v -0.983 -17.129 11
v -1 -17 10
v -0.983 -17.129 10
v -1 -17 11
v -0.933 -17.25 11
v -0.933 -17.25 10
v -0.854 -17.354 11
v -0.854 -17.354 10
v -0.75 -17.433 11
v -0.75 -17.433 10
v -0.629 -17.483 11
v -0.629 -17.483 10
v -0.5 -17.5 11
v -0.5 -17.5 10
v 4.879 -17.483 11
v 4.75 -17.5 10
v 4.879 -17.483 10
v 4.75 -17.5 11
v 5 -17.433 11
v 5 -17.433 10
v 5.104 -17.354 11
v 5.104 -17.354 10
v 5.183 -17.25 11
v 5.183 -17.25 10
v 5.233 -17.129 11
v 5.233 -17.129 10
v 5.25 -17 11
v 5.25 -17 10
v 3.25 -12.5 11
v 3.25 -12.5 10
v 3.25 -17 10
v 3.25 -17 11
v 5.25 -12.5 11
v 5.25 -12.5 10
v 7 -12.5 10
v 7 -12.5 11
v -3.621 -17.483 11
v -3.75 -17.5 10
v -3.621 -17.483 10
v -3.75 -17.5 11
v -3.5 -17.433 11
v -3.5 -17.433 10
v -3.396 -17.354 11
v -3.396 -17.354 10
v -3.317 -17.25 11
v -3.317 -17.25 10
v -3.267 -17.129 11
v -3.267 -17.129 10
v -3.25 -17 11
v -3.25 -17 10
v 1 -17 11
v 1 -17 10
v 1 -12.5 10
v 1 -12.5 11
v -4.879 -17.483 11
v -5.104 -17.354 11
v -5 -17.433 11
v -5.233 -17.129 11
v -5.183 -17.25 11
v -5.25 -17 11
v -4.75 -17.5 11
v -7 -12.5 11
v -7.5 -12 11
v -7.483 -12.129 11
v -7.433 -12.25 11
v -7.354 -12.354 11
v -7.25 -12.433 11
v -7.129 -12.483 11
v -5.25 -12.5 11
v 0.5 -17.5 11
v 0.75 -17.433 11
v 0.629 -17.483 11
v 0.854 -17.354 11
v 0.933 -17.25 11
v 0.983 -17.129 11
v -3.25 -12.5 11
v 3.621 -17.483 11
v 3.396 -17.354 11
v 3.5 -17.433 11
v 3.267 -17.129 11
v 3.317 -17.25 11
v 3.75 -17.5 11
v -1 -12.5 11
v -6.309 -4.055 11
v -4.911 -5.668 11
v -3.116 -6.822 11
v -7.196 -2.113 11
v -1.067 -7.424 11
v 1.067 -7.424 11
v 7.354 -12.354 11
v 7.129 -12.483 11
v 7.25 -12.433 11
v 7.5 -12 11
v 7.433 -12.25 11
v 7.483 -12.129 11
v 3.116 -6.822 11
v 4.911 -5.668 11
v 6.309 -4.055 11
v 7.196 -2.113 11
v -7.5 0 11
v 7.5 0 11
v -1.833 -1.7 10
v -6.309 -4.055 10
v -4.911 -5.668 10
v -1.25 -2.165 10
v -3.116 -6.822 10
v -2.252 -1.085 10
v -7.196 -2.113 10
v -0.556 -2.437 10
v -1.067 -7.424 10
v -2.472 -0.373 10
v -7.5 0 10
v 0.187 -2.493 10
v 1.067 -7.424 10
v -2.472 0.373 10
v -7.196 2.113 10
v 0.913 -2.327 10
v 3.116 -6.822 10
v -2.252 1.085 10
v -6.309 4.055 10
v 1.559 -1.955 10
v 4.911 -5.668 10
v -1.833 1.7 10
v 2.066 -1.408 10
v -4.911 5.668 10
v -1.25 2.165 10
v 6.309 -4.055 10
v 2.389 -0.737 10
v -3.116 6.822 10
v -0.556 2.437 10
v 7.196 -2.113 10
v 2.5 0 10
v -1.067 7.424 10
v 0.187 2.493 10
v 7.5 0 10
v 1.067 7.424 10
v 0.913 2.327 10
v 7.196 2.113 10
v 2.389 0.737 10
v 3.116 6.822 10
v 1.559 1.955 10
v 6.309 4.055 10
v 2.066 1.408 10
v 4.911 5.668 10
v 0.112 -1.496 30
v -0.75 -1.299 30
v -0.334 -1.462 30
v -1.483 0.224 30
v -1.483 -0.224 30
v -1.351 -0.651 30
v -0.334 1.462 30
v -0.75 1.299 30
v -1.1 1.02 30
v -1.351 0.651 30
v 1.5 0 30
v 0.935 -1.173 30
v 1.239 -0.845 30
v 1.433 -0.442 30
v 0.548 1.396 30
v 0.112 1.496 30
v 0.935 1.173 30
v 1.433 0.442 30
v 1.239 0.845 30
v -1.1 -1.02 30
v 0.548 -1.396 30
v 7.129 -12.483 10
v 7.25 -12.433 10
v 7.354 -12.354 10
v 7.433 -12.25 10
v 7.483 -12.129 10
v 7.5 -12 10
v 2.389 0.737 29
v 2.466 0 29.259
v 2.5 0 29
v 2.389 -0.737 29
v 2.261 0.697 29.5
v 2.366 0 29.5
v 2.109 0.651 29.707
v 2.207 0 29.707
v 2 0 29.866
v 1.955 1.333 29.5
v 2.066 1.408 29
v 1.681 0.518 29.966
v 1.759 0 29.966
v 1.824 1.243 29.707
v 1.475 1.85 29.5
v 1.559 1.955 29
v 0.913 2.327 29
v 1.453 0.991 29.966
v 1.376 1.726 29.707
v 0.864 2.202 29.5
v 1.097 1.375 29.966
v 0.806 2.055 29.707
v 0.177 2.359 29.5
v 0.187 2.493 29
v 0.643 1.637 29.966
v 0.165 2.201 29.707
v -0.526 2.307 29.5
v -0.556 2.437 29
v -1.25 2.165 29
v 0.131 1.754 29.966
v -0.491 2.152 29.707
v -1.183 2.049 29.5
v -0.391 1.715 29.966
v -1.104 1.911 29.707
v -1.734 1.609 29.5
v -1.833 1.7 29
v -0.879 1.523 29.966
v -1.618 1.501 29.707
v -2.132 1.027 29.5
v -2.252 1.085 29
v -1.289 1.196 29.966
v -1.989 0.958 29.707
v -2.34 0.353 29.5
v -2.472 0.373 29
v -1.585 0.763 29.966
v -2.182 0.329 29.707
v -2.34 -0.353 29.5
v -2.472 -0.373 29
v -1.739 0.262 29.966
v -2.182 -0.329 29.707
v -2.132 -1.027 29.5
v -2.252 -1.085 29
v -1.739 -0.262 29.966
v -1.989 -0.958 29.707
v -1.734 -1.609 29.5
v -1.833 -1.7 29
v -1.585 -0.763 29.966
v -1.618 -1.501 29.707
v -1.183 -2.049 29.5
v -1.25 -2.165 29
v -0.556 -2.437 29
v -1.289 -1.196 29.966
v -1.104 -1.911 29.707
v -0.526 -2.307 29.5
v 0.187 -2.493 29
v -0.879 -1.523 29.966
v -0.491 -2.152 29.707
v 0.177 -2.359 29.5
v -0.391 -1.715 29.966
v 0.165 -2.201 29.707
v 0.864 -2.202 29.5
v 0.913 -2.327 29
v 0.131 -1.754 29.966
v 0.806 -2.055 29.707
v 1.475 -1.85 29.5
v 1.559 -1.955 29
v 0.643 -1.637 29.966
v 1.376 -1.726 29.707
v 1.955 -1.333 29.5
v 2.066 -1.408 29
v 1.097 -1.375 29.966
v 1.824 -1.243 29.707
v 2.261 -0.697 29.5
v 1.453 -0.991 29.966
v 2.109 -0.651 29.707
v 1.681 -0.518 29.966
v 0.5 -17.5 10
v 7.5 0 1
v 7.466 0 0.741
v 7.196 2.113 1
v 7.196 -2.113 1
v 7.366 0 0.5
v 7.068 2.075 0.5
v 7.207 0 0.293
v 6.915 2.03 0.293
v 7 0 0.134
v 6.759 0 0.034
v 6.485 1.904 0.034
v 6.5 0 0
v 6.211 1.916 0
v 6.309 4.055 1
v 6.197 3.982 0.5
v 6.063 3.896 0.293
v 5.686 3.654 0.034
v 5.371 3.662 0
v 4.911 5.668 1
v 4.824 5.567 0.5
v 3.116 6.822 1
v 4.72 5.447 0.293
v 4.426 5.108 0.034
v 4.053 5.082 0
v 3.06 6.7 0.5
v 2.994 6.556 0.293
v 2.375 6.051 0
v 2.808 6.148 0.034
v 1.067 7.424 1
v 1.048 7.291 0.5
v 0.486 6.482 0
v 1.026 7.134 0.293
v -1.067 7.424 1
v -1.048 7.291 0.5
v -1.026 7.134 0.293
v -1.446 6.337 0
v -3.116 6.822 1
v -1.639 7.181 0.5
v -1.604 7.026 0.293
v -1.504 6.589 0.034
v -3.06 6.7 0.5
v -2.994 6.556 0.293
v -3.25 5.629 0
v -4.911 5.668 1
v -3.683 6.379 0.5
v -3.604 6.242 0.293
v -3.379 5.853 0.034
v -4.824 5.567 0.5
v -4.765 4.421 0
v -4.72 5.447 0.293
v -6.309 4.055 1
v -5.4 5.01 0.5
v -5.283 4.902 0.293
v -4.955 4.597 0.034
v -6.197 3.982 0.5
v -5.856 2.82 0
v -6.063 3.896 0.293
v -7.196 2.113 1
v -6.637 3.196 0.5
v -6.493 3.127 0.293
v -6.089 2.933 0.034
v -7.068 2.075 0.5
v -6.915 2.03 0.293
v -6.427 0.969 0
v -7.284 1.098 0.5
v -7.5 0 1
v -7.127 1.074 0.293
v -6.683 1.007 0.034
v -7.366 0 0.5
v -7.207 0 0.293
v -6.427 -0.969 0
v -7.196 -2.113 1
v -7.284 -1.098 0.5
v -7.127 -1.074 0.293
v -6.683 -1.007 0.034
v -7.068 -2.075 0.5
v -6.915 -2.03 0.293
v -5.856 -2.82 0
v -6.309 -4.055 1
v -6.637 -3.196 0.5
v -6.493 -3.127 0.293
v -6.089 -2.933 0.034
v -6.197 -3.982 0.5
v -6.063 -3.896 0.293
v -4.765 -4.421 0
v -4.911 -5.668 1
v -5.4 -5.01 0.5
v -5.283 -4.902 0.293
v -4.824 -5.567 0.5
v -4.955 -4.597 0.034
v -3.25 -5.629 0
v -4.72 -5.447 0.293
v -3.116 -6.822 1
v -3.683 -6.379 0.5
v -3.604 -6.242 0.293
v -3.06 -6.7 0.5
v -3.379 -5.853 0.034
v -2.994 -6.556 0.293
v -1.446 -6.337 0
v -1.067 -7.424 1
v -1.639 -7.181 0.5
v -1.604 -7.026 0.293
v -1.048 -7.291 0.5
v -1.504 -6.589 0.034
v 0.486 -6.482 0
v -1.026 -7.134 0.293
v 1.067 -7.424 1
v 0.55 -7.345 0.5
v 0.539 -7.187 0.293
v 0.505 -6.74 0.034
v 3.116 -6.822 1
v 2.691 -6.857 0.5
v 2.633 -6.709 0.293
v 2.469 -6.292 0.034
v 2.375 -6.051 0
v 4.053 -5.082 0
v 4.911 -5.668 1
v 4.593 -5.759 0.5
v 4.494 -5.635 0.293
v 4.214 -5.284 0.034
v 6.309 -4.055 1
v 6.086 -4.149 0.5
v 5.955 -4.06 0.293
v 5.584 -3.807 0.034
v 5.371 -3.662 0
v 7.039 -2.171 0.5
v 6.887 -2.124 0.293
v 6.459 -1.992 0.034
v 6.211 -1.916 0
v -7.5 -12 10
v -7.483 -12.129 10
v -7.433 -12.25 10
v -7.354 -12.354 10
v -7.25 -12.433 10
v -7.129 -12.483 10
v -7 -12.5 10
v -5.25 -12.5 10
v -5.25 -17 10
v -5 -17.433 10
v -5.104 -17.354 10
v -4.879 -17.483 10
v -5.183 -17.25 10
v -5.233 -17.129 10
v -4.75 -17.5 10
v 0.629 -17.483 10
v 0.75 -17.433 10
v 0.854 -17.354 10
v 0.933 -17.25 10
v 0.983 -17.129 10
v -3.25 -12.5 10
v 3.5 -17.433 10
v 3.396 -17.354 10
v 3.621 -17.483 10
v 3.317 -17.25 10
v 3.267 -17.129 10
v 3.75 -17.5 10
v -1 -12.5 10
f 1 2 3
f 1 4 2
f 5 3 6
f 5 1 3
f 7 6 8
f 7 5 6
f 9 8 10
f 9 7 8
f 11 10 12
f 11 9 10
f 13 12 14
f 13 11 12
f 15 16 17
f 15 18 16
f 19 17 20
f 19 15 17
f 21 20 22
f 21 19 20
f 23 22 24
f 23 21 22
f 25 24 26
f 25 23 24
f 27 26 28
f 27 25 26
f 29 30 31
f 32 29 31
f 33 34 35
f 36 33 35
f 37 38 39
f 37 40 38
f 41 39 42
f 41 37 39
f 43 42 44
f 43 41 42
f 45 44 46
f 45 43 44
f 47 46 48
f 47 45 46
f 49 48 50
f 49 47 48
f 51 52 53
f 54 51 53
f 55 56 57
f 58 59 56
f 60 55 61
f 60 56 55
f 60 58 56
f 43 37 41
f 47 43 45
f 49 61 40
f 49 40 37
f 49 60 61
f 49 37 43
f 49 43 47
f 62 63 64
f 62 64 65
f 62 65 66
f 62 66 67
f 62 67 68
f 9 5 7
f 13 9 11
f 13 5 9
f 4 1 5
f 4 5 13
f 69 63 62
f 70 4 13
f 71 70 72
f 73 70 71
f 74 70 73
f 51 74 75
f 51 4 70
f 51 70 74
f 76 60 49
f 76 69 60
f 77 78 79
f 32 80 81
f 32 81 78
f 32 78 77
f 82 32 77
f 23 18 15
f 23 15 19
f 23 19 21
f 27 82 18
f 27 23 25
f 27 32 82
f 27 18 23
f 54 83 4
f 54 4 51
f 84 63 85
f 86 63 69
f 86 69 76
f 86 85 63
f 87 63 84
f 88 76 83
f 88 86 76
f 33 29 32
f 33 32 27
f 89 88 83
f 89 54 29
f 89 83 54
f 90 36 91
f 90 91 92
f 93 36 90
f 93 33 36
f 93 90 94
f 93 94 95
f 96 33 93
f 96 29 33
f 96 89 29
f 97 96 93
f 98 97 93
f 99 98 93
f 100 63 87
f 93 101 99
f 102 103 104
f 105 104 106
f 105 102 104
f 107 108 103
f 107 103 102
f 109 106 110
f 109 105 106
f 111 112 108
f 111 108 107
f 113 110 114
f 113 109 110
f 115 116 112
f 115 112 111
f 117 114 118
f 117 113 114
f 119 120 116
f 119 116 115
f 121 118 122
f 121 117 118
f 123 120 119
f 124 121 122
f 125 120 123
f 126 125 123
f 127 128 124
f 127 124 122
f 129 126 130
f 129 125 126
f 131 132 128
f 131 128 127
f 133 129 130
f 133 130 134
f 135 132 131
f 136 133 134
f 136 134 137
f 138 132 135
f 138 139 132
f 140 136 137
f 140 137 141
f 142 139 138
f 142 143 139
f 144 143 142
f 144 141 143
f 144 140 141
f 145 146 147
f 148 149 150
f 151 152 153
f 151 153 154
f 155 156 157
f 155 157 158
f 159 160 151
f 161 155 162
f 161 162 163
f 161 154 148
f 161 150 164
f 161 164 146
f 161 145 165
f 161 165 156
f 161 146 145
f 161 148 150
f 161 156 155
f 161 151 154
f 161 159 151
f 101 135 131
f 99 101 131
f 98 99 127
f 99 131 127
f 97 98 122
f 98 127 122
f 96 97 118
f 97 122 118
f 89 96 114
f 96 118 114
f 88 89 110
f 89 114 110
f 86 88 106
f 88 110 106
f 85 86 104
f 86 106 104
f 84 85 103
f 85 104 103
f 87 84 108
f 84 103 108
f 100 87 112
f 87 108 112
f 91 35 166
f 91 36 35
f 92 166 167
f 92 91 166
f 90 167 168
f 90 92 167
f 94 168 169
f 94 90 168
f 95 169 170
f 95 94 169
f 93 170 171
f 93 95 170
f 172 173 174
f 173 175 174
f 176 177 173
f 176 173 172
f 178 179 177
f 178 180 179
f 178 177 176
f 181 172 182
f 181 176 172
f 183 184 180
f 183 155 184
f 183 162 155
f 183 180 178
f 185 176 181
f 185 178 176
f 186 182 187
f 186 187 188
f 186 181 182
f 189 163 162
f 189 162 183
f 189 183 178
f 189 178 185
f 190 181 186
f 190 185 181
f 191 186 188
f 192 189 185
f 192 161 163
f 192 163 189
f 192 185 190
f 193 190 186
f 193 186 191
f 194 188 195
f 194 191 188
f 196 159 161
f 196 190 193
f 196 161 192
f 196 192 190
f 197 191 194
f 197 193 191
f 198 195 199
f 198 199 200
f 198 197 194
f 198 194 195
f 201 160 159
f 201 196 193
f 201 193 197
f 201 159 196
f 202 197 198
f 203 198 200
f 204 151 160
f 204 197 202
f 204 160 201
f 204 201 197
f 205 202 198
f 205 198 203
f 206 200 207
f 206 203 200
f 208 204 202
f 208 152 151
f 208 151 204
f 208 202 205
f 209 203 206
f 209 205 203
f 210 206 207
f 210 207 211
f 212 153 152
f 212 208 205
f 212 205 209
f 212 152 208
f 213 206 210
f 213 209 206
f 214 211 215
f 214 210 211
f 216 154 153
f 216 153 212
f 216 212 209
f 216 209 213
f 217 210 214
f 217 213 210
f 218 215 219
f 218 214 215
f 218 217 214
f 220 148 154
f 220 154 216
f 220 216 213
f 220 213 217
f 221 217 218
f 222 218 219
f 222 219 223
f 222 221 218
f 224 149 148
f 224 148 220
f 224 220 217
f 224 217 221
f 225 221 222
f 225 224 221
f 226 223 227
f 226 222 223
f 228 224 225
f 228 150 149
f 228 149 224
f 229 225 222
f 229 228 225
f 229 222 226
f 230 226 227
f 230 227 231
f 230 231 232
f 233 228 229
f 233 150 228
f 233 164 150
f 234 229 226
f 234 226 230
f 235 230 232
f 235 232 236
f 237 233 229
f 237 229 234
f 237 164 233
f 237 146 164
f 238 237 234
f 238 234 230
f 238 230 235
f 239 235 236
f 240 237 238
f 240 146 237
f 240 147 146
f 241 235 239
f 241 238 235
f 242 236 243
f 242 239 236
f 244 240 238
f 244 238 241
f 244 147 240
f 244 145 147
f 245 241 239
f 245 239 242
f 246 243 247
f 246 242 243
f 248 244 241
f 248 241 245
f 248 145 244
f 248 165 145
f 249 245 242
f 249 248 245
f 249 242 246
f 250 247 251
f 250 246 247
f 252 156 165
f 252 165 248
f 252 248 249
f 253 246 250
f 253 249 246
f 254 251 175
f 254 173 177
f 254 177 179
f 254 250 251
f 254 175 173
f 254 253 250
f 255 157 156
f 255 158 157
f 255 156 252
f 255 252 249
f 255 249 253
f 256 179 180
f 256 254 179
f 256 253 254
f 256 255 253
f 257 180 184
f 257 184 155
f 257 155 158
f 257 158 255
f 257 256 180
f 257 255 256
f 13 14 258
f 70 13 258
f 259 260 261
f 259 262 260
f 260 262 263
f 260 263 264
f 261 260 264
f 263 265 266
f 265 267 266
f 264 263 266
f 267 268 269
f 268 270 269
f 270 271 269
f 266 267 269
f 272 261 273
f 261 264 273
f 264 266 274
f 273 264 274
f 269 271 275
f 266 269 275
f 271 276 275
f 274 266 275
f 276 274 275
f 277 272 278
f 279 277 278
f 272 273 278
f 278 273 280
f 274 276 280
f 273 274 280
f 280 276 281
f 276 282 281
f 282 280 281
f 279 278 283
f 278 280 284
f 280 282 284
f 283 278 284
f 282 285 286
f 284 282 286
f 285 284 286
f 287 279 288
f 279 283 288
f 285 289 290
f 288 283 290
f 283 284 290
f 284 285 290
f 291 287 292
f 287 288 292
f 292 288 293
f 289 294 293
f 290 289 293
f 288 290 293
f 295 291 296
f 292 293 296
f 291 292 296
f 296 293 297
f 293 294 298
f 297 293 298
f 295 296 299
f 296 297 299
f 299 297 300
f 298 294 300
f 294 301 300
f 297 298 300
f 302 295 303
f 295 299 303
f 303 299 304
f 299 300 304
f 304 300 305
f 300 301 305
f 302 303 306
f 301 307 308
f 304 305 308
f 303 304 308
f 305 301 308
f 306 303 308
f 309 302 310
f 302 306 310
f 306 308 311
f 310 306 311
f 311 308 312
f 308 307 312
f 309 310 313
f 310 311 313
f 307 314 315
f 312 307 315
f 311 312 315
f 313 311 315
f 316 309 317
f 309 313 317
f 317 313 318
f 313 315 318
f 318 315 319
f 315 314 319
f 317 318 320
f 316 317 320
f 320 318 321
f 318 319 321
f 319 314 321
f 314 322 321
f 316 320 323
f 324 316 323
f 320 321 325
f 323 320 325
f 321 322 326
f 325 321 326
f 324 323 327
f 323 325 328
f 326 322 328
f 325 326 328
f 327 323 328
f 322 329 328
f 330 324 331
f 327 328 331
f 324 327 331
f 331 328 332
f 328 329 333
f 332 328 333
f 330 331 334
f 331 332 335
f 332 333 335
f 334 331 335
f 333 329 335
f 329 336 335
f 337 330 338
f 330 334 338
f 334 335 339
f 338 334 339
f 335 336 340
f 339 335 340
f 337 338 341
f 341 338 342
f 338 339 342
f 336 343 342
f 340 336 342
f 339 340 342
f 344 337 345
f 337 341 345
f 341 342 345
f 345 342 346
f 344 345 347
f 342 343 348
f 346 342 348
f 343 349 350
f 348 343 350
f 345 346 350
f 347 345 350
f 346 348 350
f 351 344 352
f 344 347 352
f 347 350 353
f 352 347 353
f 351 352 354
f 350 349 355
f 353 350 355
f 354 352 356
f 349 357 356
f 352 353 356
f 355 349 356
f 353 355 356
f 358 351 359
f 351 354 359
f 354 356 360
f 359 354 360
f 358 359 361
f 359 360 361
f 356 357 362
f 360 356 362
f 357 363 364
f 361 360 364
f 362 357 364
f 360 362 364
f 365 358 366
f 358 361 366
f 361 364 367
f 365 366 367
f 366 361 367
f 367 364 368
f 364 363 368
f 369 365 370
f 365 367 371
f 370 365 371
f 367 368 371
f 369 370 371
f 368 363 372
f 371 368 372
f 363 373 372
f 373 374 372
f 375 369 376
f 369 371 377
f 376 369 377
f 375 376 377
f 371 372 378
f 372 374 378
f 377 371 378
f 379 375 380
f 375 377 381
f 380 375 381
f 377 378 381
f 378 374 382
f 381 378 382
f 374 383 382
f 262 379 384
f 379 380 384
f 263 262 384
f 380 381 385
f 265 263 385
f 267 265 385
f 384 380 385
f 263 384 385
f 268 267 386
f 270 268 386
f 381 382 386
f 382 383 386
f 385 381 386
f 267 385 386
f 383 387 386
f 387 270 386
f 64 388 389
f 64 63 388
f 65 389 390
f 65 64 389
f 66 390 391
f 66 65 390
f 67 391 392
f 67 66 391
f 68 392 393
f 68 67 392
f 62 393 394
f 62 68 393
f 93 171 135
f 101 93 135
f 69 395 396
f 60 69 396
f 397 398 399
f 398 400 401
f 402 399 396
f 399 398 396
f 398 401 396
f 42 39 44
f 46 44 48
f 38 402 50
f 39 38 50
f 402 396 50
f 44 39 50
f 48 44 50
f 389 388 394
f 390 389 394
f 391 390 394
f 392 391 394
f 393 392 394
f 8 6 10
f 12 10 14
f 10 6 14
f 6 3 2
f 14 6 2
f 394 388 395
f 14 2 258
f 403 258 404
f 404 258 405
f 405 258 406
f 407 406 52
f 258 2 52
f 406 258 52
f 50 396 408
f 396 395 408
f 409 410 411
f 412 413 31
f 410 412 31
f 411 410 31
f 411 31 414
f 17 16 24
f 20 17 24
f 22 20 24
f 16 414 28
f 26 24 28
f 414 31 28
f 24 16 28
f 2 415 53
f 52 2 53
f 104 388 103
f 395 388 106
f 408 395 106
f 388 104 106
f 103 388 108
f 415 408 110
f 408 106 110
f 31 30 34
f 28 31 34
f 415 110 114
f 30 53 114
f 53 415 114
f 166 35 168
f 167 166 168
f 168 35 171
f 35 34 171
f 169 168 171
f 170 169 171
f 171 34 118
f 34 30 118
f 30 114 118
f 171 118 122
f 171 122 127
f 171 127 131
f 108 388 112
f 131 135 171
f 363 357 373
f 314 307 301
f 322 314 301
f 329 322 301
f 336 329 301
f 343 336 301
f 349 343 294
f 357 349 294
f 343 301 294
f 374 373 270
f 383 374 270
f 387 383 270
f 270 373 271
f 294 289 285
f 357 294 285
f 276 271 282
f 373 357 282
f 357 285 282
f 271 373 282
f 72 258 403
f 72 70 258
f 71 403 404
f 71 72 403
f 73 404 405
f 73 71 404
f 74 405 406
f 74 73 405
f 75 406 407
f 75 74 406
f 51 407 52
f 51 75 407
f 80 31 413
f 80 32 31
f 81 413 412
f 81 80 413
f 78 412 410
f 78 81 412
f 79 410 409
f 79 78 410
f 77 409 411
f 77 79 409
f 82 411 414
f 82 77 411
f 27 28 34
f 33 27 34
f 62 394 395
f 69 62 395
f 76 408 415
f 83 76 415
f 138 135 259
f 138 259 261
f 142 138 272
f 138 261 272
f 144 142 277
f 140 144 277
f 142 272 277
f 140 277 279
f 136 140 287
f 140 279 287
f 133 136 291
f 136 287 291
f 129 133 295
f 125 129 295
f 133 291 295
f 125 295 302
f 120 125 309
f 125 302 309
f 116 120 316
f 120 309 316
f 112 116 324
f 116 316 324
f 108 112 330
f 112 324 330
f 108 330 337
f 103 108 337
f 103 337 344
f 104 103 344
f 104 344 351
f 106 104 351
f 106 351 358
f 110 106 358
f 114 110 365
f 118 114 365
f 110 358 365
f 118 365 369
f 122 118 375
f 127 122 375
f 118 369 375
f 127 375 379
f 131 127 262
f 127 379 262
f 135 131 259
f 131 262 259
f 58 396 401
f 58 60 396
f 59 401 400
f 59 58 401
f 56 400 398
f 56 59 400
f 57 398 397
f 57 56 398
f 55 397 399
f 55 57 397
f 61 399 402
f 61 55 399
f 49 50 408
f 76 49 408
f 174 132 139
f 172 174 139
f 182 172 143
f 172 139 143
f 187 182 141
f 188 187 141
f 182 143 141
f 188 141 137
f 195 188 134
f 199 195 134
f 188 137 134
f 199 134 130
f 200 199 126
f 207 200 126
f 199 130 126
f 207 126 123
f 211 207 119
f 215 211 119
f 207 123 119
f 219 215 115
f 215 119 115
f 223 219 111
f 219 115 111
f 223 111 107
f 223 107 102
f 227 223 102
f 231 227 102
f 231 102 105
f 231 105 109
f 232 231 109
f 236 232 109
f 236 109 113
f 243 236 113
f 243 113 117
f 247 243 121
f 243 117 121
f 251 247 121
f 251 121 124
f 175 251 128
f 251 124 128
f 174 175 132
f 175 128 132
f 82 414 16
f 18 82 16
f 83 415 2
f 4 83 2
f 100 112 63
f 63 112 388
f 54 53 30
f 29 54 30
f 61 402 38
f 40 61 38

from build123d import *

# Parameters (mm, degrees)
IZIM1_R                     = 7.5
Y_KSEKLIK_EKSTR_ZYON1_DEPTH = 10
IZIM2_R                     = 2.5
Y_KSEKLIK_EKSTR_ZYON2_DEPTH = 20
Y_KSEKLIK_EKSTR_ZYON3_DEPTH = 1
RADYUS2_R                   = 1
RADYUS3_R                   = 1
RADYUS4_R                   = 0.5


with BuildPart() as part:
    # Çizim1 → Yükseklik-Ekstrüzyon1 (new body)
    with BuildSketch(Plane.XY):
        Circle(IZIM1_R)
    extrude(amount=Y_KSEKLIK_EKSTR_ZYON1_DEPTH)

    # Çizim2 → Yükseklik-Ekstrüzyon2 (add)
    with BuildSketch(Plane.XY.offset(10)):
        Circle(IZIM2_R)
    extrude(amount=Y_KSEKLIK_EKSTR_ZYON2_DEPTH)

    # Radyus2
    radyus2_edges = [part.edges().sort_by_distance(p)[0] for p in [
        (-7.5, 0, 0),
    ]]
    fillet(radyus2_edges, radius=RADYUS2_R)

    # Radyus3
    radyus3_edges = [part.edges().sort_by_distance(p)[0] for p in [
        (-2.5, 0, 30),
    ]]
    fillet(radyus3_edges, radius=RADYUS3_R)


with BuildPart() as body_2:
    # Çizim3 → Yükseklik-Ekstrüzyon3 (new body)
    with BuildSketch(Plane.XY.offset(10)):
        with BuildLine():
            Line((-7.5, 0), (-7.5, -7.5))
            Line((-7.5, -7.5), (-7.5, -12.5))
            Line((-7.5, -12.5), (-5.25, -12.5))
            Line((-5.25, -12.5), (-5.25, -17.5))
            Line((-5.25, -17.5), (-3.25, -17.5))
            Line((-3.25, -17.5), (-3.25, -12.5))
            Line((-3.25, -12.5), (-1, -12.5))
            Line((-1, -12.5), (-1, -17.5))
            Line((-1, -17.5), (1, -17.5))
            Line((1, -17.5), (1, -12.5))
            Line((1, -12.5), (3.25, -12.5))
            Line((3.25, -12.5), (3.25, -17.5))
            Line((3.25, -17.5), (5.25, -17.5))
            Line((5.25, -17.5), (5.25, -12.5))
            Line((5.25, -12.5), (7.5, -12.5))
            Line((7.5, -12.5), (7.5, -7.5))
            Line((7.5, -7.5), (7.5, 0))
            ThreePointArc((7.5, 0), (0, -7.5), (-7.5, 0))
        make_face()
    extrude(amount=Y_KSEKLIK_EKSTR_ZYON3_DEPTH)

    # Radyus4
    radyus4_edges = [body_2.edges().sort_by_distance(p)[0] for p in [
        (7.5, -12.5, 10.5),
        (5.25, -17.5, 10.5),
        (3.25, -17.5, 10.5),
        (1, -17.5, 10.5),
        (-1, -17.5, 10.5),
        (-3.25, -17.5, 10.5),
        (-5.25, -17.5, 10.5),
        (-7.5, -12.5, 10.5),
    ]]
    fillet(radyus4_edges, radius=RADYUS4_R)


solid = Compound([part.part, body_2.part])
